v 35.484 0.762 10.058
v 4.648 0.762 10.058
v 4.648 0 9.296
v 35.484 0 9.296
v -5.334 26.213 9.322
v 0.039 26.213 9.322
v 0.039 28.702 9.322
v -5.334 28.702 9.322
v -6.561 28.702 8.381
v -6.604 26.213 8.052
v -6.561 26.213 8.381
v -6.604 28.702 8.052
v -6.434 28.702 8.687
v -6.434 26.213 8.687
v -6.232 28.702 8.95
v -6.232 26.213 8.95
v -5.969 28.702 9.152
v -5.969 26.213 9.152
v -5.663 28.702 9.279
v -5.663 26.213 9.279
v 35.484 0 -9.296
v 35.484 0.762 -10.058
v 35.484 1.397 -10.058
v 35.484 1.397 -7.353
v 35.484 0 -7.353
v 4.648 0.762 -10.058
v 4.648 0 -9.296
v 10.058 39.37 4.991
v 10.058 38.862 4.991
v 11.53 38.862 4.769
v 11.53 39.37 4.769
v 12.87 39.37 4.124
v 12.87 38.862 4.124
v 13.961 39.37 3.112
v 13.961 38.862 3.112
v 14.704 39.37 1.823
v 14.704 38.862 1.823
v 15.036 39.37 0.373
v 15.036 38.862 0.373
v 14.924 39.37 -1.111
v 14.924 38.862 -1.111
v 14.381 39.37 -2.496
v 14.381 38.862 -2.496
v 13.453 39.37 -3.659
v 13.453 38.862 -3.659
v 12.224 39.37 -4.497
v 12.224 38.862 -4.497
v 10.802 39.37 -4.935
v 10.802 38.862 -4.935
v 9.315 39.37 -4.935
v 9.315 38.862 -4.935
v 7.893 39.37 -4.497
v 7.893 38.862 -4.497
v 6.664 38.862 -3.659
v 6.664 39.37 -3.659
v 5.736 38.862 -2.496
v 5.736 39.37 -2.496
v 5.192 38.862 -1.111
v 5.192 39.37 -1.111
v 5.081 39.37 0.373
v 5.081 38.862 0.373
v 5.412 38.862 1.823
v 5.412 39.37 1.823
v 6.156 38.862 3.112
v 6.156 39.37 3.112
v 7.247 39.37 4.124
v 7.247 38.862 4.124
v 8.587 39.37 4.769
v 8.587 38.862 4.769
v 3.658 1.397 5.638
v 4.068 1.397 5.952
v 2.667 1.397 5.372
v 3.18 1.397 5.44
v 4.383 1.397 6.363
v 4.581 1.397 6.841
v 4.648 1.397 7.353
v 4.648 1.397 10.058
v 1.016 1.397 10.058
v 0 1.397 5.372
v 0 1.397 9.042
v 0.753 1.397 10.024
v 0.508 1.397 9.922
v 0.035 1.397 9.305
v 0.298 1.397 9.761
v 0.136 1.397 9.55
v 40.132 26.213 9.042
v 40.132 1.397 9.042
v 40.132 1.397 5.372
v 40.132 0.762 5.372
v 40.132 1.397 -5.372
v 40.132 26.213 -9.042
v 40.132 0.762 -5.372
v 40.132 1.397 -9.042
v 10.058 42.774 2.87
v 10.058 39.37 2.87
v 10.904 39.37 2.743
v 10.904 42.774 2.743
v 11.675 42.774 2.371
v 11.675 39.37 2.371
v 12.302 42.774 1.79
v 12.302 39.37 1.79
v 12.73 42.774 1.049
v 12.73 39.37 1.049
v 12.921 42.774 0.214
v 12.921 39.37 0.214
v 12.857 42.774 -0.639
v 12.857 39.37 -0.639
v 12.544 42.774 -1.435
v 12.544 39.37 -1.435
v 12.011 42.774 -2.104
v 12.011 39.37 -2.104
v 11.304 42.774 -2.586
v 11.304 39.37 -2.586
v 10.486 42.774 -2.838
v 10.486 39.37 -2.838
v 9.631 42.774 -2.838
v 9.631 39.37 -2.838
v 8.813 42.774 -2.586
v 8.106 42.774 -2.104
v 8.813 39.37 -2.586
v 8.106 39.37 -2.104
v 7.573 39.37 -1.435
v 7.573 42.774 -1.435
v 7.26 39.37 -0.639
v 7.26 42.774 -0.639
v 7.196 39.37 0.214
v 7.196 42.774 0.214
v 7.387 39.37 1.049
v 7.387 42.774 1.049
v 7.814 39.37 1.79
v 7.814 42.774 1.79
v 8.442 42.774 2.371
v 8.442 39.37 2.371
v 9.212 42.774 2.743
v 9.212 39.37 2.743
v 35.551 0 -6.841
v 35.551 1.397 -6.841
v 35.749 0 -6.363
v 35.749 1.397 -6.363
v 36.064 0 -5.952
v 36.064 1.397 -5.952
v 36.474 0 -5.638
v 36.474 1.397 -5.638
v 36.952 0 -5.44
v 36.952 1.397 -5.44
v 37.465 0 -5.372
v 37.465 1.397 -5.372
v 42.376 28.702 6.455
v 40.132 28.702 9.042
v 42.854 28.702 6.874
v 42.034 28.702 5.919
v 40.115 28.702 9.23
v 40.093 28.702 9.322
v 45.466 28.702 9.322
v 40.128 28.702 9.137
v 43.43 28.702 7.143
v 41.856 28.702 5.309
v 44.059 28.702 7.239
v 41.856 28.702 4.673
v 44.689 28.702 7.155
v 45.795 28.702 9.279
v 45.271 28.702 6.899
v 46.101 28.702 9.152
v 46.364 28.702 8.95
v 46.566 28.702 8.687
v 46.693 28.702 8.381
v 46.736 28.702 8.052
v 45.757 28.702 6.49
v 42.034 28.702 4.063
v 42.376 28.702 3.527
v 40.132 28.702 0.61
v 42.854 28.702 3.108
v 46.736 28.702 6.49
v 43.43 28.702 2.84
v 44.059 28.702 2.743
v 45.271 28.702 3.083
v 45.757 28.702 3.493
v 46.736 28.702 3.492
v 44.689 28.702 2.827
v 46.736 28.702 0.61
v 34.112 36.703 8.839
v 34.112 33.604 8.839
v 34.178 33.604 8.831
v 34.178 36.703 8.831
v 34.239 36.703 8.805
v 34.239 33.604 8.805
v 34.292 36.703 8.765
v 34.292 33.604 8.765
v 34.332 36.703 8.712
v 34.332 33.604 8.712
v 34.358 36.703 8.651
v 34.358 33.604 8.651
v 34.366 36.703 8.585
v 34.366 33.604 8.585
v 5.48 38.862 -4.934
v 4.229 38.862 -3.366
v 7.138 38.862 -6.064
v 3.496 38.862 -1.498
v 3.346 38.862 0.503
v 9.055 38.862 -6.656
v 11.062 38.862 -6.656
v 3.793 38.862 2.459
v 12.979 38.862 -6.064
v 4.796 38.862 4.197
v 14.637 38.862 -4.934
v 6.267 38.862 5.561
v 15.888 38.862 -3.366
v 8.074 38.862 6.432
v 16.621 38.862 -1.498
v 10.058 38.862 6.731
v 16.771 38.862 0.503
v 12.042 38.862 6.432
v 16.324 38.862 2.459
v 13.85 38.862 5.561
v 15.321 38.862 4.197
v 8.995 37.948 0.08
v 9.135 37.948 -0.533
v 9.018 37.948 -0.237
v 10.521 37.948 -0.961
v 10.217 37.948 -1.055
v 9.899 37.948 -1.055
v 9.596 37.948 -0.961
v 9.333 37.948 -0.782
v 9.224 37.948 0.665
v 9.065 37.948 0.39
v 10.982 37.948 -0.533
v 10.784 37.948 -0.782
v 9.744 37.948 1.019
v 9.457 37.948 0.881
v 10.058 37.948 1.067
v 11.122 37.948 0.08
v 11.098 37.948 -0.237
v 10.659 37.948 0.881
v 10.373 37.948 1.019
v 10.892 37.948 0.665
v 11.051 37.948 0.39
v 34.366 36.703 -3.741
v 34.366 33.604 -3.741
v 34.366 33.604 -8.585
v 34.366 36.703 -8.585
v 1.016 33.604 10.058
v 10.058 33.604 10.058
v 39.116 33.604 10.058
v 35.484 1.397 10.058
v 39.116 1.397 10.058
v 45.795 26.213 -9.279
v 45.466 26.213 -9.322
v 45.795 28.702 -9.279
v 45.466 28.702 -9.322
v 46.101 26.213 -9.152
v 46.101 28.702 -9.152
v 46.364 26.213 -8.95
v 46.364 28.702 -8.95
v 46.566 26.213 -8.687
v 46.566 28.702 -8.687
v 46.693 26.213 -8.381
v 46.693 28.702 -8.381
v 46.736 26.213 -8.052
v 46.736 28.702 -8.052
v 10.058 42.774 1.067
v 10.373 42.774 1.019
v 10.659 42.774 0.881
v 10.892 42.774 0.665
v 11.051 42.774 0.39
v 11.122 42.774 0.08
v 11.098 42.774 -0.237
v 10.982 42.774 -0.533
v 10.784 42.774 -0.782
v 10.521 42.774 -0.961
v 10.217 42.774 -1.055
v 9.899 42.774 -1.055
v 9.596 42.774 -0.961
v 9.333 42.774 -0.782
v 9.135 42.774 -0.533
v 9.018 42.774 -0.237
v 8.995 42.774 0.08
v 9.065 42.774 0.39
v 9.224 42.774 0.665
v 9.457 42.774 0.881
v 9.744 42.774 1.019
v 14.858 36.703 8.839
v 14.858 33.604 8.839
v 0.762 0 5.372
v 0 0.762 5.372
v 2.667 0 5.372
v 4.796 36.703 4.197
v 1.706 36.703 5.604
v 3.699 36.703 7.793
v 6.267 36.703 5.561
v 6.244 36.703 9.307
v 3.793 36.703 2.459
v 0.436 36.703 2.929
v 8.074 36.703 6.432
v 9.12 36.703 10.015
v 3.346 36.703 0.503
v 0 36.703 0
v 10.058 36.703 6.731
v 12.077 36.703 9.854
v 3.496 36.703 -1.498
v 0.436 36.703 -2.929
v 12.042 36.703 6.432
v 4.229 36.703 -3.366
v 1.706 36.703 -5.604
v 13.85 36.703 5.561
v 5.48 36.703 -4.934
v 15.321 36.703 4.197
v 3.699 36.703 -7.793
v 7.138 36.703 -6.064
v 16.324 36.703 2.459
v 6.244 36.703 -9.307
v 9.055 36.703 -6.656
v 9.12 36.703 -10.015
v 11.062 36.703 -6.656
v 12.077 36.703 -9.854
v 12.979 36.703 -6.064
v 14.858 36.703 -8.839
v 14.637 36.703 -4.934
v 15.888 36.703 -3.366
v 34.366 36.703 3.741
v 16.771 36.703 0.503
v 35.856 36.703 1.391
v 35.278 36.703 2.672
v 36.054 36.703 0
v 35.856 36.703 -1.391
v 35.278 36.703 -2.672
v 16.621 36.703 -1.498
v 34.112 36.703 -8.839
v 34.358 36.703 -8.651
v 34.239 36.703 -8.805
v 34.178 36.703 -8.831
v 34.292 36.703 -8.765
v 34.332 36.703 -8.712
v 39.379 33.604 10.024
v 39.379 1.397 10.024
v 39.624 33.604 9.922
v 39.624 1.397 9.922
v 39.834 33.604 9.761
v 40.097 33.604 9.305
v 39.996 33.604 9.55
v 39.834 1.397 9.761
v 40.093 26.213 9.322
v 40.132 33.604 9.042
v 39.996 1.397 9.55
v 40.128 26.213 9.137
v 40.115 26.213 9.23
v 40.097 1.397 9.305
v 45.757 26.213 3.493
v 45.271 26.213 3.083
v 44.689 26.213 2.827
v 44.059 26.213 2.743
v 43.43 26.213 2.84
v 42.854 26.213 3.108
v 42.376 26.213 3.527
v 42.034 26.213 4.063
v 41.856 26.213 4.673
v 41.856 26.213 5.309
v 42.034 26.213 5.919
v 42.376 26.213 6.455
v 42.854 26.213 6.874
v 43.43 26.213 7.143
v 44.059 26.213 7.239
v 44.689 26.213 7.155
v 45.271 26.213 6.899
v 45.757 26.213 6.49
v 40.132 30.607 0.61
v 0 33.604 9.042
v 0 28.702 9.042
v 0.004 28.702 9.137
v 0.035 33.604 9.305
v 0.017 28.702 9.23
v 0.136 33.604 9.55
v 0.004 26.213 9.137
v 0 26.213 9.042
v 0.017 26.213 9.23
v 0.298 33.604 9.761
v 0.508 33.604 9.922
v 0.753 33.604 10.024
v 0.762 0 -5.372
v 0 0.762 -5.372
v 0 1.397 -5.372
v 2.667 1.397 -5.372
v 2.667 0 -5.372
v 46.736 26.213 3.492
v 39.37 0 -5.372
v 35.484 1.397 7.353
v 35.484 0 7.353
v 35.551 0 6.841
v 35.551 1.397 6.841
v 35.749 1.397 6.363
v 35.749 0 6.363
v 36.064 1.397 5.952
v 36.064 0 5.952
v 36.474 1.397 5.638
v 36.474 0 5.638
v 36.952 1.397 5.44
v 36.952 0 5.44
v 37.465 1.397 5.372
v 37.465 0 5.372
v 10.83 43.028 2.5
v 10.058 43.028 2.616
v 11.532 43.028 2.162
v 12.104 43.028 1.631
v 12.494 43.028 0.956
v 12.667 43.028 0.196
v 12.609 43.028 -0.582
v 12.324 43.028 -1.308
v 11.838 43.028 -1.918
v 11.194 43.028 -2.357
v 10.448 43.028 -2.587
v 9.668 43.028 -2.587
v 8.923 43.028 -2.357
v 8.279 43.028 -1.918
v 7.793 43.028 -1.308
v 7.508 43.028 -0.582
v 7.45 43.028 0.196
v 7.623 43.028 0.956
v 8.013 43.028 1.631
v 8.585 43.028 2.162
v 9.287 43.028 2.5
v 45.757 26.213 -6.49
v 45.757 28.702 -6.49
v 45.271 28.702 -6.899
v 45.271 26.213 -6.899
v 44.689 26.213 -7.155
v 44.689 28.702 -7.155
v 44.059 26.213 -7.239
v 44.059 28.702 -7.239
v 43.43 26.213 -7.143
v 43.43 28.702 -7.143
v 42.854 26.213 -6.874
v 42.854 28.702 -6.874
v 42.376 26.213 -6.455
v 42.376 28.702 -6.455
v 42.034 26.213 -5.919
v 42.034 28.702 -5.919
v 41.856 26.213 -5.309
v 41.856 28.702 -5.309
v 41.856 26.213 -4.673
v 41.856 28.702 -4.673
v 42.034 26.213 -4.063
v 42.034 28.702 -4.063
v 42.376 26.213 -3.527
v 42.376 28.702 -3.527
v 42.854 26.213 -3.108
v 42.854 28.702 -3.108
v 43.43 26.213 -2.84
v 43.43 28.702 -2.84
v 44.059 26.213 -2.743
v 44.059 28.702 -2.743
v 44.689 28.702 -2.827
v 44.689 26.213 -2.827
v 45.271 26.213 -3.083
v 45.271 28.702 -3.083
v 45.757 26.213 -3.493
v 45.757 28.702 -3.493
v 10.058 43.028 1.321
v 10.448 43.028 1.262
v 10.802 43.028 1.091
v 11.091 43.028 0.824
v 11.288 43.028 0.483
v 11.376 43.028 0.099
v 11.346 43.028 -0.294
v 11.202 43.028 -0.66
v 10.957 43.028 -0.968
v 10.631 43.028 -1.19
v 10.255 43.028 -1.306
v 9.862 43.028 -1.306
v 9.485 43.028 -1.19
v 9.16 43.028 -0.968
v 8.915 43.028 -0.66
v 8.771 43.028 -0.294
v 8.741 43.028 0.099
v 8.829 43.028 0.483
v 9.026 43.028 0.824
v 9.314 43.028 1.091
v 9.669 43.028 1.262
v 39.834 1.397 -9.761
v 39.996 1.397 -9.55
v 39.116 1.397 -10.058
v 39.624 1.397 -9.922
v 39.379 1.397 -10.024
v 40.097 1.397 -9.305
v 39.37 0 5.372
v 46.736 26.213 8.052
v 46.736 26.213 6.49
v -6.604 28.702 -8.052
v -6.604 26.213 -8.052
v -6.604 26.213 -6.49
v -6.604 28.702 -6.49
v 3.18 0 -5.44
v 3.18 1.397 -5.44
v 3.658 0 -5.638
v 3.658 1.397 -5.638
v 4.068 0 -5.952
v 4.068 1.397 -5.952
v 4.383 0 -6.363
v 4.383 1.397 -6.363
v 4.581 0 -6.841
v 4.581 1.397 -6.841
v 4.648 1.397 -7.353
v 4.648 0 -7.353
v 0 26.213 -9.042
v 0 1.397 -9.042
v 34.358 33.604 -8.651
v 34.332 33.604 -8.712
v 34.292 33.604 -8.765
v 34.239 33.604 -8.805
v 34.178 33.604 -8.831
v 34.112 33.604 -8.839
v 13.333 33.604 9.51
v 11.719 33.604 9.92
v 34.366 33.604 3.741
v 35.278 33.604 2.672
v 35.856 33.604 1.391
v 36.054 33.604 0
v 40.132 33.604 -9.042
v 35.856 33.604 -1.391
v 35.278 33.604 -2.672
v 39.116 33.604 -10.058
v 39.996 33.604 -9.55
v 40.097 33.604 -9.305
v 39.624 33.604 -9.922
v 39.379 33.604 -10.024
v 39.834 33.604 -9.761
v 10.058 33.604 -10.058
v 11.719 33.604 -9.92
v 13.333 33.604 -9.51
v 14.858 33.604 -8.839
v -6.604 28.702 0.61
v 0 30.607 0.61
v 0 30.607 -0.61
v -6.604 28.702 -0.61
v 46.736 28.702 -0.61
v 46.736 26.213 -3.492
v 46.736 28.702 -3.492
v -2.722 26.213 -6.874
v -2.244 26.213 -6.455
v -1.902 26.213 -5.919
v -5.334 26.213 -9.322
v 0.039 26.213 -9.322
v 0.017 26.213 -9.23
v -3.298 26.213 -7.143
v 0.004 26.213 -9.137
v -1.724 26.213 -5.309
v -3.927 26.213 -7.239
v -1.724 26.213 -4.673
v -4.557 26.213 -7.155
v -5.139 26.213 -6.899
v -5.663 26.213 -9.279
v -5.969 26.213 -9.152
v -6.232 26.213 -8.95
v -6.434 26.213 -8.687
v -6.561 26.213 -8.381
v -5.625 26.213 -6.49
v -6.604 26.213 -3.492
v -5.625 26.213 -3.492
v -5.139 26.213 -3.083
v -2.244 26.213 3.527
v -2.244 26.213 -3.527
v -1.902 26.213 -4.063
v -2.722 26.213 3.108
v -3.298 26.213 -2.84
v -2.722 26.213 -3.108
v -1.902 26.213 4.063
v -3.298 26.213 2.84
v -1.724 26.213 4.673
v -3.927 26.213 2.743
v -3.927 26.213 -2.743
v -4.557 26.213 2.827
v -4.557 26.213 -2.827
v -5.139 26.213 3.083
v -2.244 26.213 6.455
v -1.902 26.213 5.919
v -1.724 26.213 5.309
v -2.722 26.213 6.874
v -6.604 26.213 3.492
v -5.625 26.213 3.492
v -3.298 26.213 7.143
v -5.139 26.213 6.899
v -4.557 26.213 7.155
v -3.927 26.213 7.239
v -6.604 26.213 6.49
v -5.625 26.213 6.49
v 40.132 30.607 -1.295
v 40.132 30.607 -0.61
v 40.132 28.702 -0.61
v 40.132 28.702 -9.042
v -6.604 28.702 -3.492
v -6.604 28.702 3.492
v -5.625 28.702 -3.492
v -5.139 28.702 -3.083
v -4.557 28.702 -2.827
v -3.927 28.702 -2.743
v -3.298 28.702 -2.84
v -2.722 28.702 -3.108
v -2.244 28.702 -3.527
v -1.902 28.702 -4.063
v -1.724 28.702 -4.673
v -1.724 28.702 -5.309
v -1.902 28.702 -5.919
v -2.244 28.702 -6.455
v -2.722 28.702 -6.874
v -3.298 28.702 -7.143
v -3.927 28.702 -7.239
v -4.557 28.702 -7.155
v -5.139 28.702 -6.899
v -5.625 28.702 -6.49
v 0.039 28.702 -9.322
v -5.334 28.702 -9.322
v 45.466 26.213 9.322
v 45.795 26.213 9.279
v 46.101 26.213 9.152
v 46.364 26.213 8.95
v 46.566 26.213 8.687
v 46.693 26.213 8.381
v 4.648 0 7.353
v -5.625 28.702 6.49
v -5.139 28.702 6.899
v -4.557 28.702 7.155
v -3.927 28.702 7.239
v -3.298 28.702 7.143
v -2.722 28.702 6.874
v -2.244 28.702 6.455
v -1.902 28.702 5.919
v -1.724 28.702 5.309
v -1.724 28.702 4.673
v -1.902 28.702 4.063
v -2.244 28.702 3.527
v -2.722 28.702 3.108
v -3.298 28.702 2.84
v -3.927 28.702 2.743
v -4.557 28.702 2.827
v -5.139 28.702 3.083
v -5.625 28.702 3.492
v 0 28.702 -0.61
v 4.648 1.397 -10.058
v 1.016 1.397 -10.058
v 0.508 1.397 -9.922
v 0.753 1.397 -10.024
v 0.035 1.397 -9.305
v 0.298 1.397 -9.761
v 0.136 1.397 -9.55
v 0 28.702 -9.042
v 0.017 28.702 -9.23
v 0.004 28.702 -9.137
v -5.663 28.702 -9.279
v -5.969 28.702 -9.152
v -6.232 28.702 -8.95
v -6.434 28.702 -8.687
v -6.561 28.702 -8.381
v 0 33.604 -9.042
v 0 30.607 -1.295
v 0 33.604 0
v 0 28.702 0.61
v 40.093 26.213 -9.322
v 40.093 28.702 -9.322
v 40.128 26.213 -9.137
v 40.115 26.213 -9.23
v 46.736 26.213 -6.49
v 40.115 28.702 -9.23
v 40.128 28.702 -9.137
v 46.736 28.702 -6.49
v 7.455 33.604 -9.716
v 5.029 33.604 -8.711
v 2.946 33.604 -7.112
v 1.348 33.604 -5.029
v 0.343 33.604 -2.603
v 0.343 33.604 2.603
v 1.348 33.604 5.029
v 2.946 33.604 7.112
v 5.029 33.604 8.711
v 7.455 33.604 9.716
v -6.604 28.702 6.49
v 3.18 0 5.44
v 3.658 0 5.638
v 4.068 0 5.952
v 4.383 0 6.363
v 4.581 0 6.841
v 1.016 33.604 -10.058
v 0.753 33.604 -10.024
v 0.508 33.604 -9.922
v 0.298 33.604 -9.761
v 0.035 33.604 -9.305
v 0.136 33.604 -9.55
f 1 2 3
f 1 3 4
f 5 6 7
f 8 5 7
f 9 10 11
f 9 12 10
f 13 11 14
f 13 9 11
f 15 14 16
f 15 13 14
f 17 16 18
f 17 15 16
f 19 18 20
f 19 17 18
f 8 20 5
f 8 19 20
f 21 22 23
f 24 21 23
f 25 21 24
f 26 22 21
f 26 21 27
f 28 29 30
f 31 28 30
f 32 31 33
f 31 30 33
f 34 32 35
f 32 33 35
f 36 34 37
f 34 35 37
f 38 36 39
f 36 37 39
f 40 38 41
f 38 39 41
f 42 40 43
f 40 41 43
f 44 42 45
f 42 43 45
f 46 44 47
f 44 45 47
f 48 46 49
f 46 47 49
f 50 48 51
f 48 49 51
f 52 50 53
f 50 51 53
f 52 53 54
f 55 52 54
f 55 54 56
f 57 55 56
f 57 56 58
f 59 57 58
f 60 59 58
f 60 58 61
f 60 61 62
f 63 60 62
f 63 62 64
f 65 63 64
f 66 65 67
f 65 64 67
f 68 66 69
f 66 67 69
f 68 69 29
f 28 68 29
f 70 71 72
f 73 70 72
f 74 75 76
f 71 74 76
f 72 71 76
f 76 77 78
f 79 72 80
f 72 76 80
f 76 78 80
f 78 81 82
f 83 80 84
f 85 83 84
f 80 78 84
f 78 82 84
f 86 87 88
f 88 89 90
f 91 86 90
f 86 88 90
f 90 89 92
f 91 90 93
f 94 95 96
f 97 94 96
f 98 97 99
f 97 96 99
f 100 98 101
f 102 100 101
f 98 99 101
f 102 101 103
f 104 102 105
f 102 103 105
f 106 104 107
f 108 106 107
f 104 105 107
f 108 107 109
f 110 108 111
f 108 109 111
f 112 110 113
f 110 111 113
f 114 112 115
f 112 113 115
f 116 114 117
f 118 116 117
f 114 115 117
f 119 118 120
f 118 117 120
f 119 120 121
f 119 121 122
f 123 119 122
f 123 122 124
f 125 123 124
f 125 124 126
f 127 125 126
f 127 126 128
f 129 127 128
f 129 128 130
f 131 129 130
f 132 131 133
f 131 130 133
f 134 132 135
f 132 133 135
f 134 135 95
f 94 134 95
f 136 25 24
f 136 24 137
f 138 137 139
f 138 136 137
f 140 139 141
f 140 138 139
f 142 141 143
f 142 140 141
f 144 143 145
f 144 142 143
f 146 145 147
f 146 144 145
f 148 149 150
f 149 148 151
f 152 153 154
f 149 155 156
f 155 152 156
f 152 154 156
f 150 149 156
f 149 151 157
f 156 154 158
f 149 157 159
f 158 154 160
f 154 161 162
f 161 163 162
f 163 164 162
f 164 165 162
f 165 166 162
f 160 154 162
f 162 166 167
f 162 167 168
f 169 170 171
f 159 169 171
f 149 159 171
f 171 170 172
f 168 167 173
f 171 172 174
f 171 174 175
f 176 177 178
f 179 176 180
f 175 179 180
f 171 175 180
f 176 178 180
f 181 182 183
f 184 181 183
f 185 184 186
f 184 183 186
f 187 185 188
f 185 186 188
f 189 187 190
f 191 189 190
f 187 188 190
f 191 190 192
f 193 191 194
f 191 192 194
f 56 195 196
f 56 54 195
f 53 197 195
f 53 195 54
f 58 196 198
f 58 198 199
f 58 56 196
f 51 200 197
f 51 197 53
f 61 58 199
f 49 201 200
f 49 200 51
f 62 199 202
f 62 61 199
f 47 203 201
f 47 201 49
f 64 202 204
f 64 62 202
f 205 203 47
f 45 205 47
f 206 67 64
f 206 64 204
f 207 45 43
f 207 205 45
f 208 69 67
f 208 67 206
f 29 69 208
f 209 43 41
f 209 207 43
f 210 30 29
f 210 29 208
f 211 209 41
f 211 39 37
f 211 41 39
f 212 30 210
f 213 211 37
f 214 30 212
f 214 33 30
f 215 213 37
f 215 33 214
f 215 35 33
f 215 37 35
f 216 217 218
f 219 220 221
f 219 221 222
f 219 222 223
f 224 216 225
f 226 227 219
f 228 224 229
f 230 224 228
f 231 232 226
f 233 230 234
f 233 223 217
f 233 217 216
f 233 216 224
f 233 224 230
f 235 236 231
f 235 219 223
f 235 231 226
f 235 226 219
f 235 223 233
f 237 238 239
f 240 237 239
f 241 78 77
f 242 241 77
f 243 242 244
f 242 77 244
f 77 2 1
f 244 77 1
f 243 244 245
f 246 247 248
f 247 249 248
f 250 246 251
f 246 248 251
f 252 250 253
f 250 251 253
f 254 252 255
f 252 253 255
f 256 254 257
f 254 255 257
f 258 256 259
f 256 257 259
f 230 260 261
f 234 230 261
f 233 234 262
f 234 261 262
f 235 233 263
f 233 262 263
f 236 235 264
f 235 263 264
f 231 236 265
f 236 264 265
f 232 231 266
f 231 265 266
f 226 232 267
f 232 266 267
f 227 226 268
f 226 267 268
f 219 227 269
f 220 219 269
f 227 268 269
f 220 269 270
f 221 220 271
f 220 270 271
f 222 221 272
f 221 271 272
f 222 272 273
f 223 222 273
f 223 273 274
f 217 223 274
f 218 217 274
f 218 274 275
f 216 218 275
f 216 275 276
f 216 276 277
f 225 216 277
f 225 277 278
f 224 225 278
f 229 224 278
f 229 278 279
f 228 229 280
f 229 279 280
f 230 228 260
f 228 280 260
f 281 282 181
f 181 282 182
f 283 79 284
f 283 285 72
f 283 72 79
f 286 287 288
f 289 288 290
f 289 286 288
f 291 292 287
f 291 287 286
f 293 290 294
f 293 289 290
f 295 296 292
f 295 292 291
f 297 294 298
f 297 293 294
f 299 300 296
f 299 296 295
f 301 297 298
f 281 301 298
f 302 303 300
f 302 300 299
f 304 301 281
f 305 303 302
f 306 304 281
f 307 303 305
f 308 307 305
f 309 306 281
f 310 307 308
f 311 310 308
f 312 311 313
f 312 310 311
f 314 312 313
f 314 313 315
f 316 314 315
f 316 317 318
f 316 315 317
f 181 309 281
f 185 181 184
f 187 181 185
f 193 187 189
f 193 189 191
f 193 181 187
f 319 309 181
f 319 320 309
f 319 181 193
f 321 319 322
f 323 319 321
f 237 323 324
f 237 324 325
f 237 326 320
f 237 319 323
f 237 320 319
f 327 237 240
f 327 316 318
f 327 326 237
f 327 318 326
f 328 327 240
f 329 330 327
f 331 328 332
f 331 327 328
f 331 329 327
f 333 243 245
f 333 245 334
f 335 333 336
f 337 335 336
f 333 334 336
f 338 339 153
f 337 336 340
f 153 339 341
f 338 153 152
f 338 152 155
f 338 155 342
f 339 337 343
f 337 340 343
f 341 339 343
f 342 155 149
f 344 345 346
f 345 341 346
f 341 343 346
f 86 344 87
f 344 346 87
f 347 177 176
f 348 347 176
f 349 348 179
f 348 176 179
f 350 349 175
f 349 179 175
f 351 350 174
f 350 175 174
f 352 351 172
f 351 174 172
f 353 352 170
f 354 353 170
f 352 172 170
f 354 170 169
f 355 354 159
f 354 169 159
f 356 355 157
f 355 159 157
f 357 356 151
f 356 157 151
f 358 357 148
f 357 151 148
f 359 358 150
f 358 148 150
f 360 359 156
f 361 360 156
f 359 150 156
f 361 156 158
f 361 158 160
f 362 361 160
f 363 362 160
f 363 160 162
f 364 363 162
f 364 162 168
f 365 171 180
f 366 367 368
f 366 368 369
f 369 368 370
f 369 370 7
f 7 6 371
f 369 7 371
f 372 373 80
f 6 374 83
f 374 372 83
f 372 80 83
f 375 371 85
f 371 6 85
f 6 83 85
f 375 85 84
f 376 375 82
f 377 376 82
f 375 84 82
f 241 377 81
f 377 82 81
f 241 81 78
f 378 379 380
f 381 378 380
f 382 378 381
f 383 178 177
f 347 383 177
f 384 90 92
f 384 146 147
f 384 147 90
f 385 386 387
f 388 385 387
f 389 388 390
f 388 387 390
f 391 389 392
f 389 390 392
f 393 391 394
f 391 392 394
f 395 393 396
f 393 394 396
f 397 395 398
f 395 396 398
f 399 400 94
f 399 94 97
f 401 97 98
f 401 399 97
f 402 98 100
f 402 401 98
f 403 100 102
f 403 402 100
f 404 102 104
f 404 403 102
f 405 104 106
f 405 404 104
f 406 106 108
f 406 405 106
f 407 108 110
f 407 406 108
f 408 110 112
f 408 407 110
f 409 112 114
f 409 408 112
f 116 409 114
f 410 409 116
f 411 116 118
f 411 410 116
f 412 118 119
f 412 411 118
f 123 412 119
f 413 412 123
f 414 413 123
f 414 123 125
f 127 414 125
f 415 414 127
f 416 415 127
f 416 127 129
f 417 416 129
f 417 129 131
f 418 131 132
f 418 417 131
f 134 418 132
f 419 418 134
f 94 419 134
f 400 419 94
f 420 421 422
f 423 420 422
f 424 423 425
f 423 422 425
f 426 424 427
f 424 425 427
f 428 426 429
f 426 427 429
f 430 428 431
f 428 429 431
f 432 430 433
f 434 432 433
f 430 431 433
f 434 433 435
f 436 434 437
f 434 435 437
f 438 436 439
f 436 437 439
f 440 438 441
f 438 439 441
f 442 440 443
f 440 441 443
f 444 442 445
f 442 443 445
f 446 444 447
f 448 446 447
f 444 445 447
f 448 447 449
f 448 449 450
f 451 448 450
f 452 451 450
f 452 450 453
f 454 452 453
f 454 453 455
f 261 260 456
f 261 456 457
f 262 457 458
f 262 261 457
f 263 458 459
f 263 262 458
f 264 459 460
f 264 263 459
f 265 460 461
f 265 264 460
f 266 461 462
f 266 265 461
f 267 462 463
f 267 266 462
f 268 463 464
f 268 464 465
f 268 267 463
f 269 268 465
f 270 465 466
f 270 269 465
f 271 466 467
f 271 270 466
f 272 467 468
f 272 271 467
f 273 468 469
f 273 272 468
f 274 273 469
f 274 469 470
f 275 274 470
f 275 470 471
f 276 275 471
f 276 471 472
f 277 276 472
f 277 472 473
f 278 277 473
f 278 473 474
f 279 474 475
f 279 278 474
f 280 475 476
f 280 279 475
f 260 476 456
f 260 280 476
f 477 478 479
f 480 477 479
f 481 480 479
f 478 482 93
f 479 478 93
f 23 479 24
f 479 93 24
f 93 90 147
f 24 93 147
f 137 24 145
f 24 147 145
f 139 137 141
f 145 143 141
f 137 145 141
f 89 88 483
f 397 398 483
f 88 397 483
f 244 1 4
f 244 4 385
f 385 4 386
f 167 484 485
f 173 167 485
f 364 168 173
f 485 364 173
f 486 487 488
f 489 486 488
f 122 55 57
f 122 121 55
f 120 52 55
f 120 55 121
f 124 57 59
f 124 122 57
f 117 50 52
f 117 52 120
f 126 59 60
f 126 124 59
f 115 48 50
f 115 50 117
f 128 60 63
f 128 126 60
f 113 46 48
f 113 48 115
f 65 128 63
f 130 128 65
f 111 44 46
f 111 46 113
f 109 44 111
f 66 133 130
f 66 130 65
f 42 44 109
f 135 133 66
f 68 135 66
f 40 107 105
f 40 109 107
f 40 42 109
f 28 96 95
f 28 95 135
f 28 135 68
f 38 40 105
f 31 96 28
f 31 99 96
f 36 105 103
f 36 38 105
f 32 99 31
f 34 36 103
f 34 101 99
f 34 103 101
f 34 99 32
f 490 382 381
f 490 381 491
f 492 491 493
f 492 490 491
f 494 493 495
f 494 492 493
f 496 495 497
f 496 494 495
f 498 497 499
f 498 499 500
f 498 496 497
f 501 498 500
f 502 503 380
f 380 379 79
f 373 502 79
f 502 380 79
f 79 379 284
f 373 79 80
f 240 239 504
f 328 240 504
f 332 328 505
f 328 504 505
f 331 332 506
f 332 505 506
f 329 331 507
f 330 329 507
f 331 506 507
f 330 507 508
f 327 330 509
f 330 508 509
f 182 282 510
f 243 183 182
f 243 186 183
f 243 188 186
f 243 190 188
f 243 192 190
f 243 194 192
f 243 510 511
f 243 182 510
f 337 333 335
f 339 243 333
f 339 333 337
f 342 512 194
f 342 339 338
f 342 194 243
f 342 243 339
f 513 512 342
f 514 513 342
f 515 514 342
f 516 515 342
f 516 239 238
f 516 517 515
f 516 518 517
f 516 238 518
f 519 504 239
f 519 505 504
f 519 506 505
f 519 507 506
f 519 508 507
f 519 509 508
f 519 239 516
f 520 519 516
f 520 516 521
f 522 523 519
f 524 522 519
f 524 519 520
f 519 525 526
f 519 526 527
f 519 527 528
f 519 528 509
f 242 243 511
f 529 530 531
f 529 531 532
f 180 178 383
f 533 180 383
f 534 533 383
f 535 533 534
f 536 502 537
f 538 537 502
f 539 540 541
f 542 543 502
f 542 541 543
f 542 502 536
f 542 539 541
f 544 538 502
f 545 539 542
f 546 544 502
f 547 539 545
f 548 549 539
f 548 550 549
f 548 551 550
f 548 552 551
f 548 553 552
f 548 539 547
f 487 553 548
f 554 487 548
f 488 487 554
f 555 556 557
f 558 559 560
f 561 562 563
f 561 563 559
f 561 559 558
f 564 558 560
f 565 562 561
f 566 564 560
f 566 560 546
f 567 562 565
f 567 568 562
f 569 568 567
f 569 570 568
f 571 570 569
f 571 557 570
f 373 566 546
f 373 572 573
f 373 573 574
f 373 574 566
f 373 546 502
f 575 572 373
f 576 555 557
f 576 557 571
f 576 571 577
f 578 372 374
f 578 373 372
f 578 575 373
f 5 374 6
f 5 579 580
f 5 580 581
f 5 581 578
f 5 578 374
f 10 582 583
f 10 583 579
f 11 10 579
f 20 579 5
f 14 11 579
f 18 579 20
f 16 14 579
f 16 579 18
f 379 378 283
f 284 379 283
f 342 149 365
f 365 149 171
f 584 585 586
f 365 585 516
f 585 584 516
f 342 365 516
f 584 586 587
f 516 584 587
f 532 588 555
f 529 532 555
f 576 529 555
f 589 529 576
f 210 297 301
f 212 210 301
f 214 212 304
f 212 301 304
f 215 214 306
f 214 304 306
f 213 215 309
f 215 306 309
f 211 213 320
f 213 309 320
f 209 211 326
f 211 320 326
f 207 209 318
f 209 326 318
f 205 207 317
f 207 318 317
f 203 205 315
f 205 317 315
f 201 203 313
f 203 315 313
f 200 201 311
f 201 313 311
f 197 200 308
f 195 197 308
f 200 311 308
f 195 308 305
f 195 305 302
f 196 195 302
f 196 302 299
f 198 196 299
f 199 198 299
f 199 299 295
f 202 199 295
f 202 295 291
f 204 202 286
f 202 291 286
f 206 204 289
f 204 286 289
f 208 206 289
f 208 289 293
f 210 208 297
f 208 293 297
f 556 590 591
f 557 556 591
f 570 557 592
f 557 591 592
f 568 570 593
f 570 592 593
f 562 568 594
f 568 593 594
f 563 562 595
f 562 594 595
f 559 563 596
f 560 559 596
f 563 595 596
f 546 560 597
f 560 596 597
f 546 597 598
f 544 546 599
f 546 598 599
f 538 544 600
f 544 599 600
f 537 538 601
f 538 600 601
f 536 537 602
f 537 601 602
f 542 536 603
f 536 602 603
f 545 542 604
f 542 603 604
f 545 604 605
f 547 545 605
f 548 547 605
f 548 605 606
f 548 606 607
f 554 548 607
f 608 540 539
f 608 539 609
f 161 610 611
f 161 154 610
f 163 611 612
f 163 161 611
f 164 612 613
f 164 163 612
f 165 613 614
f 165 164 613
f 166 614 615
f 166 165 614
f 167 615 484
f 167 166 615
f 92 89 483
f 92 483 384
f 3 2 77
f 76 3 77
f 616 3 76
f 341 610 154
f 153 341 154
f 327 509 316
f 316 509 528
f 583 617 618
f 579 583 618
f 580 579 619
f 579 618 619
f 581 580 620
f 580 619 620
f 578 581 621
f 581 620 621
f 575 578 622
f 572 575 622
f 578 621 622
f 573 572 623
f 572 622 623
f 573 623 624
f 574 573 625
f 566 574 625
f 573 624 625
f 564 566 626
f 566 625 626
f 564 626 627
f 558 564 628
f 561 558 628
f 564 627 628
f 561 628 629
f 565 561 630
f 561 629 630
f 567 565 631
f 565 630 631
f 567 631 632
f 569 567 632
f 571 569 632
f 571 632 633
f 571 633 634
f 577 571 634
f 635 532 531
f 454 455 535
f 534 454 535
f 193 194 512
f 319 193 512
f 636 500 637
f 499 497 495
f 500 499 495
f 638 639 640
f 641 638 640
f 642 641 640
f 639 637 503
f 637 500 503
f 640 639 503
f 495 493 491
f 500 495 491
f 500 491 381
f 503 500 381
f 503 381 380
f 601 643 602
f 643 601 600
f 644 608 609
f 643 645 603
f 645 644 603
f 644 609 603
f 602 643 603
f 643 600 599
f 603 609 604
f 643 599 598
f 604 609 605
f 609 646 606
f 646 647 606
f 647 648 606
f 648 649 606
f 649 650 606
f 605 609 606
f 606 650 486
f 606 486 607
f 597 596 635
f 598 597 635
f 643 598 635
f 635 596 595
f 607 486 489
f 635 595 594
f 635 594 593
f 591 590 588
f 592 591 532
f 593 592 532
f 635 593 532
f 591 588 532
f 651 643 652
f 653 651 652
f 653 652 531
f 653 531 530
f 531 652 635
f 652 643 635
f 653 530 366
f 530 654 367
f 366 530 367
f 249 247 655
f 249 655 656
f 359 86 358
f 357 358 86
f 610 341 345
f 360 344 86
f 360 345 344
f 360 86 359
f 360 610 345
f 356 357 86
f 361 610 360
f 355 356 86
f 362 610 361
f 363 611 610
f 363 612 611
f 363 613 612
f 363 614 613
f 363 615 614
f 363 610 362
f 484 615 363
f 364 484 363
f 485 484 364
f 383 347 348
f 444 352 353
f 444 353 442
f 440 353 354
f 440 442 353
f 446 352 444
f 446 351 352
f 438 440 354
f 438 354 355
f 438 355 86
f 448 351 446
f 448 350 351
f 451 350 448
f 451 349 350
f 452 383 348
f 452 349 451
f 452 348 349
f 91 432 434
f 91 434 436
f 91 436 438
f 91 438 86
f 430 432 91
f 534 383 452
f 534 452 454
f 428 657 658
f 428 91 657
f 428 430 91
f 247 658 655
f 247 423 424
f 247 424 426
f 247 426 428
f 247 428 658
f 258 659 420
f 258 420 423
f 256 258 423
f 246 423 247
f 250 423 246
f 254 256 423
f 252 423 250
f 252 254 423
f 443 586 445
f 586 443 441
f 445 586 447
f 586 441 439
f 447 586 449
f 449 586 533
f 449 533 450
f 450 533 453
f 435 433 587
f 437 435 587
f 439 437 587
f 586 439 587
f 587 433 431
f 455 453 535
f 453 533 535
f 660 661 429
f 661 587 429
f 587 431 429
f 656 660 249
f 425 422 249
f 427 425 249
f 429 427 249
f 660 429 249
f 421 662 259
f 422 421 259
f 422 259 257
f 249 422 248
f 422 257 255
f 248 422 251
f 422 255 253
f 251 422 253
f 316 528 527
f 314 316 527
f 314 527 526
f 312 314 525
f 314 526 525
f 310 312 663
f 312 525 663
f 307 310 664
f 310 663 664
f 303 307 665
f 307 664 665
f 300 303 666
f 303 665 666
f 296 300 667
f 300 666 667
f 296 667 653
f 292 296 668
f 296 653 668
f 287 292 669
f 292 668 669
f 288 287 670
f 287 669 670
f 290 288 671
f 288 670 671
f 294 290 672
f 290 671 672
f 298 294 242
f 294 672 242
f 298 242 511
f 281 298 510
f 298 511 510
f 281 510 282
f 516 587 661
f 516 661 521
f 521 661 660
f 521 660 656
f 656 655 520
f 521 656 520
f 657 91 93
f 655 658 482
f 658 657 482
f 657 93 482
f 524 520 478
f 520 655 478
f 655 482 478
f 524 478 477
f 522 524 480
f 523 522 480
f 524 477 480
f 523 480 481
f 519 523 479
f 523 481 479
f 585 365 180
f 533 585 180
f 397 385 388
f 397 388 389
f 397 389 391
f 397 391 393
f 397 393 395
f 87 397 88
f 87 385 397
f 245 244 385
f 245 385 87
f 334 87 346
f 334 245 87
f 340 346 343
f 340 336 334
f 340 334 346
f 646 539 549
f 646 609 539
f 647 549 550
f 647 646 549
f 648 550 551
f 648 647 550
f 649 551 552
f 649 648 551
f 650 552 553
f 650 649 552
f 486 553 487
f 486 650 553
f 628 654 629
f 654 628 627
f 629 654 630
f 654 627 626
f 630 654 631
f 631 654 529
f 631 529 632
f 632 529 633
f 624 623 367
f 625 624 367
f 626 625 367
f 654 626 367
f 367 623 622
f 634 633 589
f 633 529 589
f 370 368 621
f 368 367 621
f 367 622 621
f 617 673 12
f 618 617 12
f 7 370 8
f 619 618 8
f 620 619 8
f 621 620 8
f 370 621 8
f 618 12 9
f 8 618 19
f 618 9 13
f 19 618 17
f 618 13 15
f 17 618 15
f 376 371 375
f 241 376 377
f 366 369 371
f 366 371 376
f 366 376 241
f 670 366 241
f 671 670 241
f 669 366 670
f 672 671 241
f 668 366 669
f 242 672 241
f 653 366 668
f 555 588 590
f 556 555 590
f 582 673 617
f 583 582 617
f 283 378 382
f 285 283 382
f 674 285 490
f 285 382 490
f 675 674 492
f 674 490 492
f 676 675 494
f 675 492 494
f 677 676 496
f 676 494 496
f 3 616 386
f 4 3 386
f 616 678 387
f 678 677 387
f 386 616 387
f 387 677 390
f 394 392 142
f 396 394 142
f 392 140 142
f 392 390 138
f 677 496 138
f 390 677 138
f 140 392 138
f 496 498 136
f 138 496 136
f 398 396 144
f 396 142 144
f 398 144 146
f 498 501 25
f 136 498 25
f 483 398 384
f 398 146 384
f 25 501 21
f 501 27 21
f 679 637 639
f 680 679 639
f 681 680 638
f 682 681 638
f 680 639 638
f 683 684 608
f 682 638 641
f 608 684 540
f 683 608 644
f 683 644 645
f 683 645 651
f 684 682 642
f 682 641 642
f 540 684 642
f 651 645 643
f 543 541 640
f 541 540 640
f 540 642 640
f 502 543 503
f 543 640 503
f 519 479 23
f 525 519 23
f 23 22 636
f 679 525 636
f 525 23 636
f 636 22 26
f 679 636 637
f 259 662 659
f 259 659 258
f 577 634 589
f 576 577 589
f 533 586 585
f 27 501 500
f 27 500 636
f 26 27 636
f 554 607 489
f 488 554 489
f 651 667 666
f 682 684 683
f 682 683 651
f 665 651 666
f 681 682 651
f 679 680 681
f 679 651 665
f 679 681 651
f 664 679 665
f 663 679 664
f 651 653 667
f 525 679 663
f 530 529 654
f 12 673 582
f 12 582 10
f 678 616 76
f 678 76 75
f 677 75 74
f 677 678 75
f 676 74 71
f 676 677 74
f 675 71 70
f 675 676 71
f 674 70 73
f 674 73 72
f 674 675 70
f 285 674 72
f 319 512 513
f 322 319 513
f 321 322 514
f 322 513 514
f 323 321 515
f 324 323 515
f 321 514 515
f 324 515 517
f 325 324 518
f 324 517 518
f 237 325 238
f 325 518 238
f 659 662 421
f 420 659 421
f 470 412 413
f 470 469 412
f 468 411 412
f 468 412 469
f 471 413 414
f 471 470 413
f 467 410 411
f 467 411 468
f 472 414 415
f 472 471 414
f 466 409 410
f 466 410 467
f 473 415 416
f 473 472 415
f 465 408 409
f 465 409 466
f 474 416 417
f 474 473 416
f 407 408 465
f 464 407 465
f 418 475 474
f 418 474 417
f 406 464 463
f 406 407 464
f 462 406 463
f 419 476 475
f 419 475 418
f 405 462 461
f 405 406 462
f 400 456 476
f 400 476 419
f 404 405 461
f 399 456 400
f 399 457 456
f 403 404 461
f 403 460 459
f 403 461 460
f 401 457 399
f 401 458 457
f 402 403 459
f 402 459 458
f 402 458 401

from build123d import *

# Parameters (mm, degrees)
BOSS_EXTRUDE1_DEPTH = 33.6042
CUT_EXTRUDE1_DEPTH  = 1.397
CHAMFER1_SIZE       = 0.762
SKETCH3_W           = 18.6436
SKETCH3_H           = 2.4892
BOSS_EXTRUDE2_DEPTH = 6.604
SKETCH4_W           = 18.6436
SKETCH4_H           = 2.4892
BOSS_EXTRUDE3_DEPTH = 6.604
FILLET1_R           = 1.27
CUT_EXTRUDE2_DEPTH  = 3.048
SKETCH6_W           = 6.604
SKETCH6_H           = 1.2192
BOSS_EXTRUDE4_DEPTH = 1.905
CUT_EXTRUDE3_DEPTH  = 1.905
BOSS_EXTRUDE5_DEPTH = 3.0988
SKETCH9_R           = 6.731
BOSS_EXTRUDE6_DEPTH = 2.159
SKETCH10_R          = 4.9911
BOSS_EXTRUDE7_DEPTH = 0.508
SKETCH11_R          = 2.8702
BOSS_EXTRUDE8_DEPTH = 3.6576
SKETCH12_R          = 1.0668
CUT_EXTRUDE4_DEPTH  = 5.08
CHAMFER2_SIZE       = 0.254


with BuildPart() as part:
    # Sketch1 → Boss-Extrude1 (new body)
    with BuildSketch(Plane(origin=(0, 0, 0), x_dir=(1, 0, 0), z_dir=(0, 1, 0))):
        with BuildLine():
            Line((0, 9.0424), (0, -9.0424))
            ThreePointArc((0, -9.0424), (0.29757951, -9.76082049), (1.016, -10.0584))
            Line((1.016, -10.0584), (39.116, -10.0584))
            ThreePointArc((39.116, -10.0584), (39.83442049, -9.76082049), (40.132, -9.0424))
            Line((40.132, -9.0424), (40.132, 9.0424))
            ThreePointArc((40.132, 9.0424), (39.83442049, 9.76082049), (39.116, 10.0584))
            Line((39.116, 10.0584), (1.016, 10.0584))
            ThreePointArc((1.016, 10.0584), (0.29757951, 9.76082049), (0, 9.0424))
        make_face()
    extrude(amount=BOSS_EXTRUDE1_DEPTH)

    # Sketch2 → Cut-Extrude1 (cut)
    with BuildSketch(Plane.XZ):
        with BuildLine():
            Line((4.6482, 10.0584), (4.6482, 7.3533))
            ThreePointArc((4.6482, 7.3533), (4.067919955, 5.952380045), (2.667, 5.3721))
            Line((2.667, 5.3721), (0, 5.3721))
            Line((0, 5.3721), (0, 9.0424))
            ThreePointArc((0, 9.0424), (0.29757951, 9.76082049), (1.016, 10.0584))
            Line((1.016, 10.0584), (4.6482, 10.0584))
        make_face()
        with BuildLine():
            Line((35.4838, 10.0584), (35.4838, 7.3533))
            ThreePointArc((35.4838, 7.3533), (36.064080045, 5.952380045), (37.465, 5.3721))
            Line((37.465, 5.3721), (40.132, 5.3721))
            Line((40.132, 5.3721), (40.132, 9.0424))
            ThreePointArc((40.132, 9.0424), (39.83442049, 9.76082049), (39.116, 10.0584))
            Line((39.116, 10.0584), (35.4838, 10.0584))
        make_face()
        with BuildLine():
            Line((0, -5.3721), (2.667, -5.3721))
            ThreePointArc((2.667, -5.3721), (4.067919955, -5.952380045), (4.6482, -7.3533))
            Line((4.6482, -7.3533), (4.6482, -10.0584))
            Line((4.6482, -10.0584), (1.016, -10.0584))
            ThreePointArc((1.016, -10.0584), (0.29757951, -9.76082049), (0, -9.0424))
            Line((0, -9.0424), (0, -5.3721))
        make_face()
        with BuildLine():
            Line((37.465, -5.3721), (40.132, -5.3721))
            Line((40.132, -5.3721), (40.132, -9.0424))
            ThreePointArc((40.132, -9.0424), (39.83442049, -9.76082049), (39.116, -10.0584))
            Line((39.116, -10.0584), (35.4838, -10.0584))
            Line((35.4838, -10.0584), (35.4838, -7.3533))
            ThreePointArc((35.4838, -7.3533), (36.064080045, -5.952380045), (37.465, -5.3721))
        make_face()
    extrude(amount=-CUT_EXTRUDE1_DEPTH, mode=Mode.SUBTRACT)

    # Chamfer1
    chamfer1_edges = [part.edges().sort_by_distance(p)[0] for p in [
        (20.066, 0, 10.0584),
        (0, 0, 0),
        (40.132, 0, 0),
        (20.066, 0, -10.0584),
    ]]
    chamfer(chamfer1_edges, length=CHAMFER1_SIZE)

    # Sketch3 → Boss-Extrude2 (add, symmetric)
    with BuildSketch(Plane(origin=(40.132, 0, 0), x_dir=(0, 0, -1), z_dir=(1, 0, 0))):
        with Locations((0, 27.4574)):
            Rectangle(SKETCH3_W, SKETCH3_H)
    extrude(amount=BOSS_EXTRUDE2_DEPTH, both=True)

    # Sketch4 → Boss-Extrude3 (add, symmetric)
    with BuildSketch(Plane.ZY):
        with Locations((0, 27.4574)):
            Rectangle(SKETCH4_W, SKETCH4_H)
    extrude(amount=BOSS_EXTRUDE3_DEPTH, both=True)

    # Fillet1
    fillet1_edges = [part.edges().sort_by_distance(p)[0] for p in [
        (46.736, 27.4574, 9.3218),
        (46.736, 27.4574, -9.3218),
        (-6.604, 27.4574, -9.3218),
        (-6.604, 27.4574, 9.3218),
    ]]
    fillet(fillet1_edges, radius=FILLET1_R)

    # Sketch5 → Cut-Extrude2 (cut)
    with BuildSketch(Plane(origin=(0, 28.702, 0), x_dir=(1, 0, 0), z_dir=(0, 1, 0))):
        with BuildLine():
            Line((-6.604, 3.4925), (-5.625185736, 3.4925))
            ThreePointArc((-5.625185736, 3.4925), (-1.7018, 4.9911), (-5.625185736, 6.4897))
            Line((-5.625185736, 6.4897), (-6.604, 6.4897))
            Line((-6.604, 6.4897), (-6.604, 3.4925))
        make_face()
        with BuildLine():
            Line((-6.604, -6.4897), (-5.625185736, -6.4897))
            ThreePointArc((-5.625185736, -6.4897), (-1.7018, -4.9911), (-5.625185736, -3.4925))
            Line((-5.625185736, -3.4925), (-6.604, -3.4925))
            Line((-6.604, -3.4925), (-6.604, -6.4897))
        make_face()
        with BuildLine():
            Line((45.757185736, -6.4897), (46.736, -6.4897))
            Line((46.736, -6.4897), (46.736, -3.4925))
            Line((46.736, -3.4925), (45.757185736, -3.4925))
            ThreePointArc((45.757185736, -3.4925), (41.8338, -4.9911), (45.757185736, -6.4897))
        make_face()
        with BuildLine():
            Line((45.757185736, 3.4925), (46.736, 3.4925))
            Line((46.736, 3.4925), (46.736, 6.4897))
            Line((46.736, 6.4897), (45.757185736, 6.4897))
            ThreePointArc((45.757185736, 6.4897), (41.8338, 4.9911), (45.757185736, 3.4925))
        make_face()
    extrude(amount=-CUT_EXTRUDE2_DEPTH, mode=Mode.SUBTRACT)

    # Sketch6 → Boss-Extrude4 (add)
    with BuildSketch(Plane(origin=(0, 28.702, 0), x_dir=(1, 0, 0), z_dir=(0, 1, 0))):
        with Locations((-3.302, 0)):
            Rectangle(SKETCH6_W, SKETCH6_H)
        with Locations((43.434, 0)):
            Rectangle(SKETCH6_W, SKETCH6_H)
    extrude(amount=BOSS_EXTRUDE4_DEPTH)

    # Sketch7 → Cut-Extrude3 (cut)
    with BuildSketch(Plane.XY.offset(0.6096)):
        Polygon((40.132, 30.607), (46.736, 28.702), (46.736, 30.607), align=None)
        Polygon((0, 30.607), (-6.604, 28.702), (-6.604, 30.607), align=None)
    extrude(amount=-CUT_EXTRUDE3_DEPTH, mode=Mode.SUBTRACT)

    # Sketch8 → Boss-Extrude5 (add)
    with BuildSketch(Plane(origin=(0, 33.6042, 0), x_dir=(1, 0, 0), z_dir=(0, 1, 0))):
        with BuildLine():
            Line((14.8583952, -8.8392), (34.1122, -8.8392))
            ThreePointArc((34.1122, -8.8392), (34.291805122, -8.764805122), (34.3662, -8.5852))
            Line((34.3662, -8.5852), (34.3662, -3.741254719))
            ThreePointArc((34.3662, -3.741254719), (36.053651663, 0), (34.3662, 3.741254719))
            Line((34.3662, 3.741254719), (34.3662, 8.5852))
            ThreePointArc((34.3662, 8.5852), (34.291805122, 8.764805122), (34.1122, 8.8392))
            Line((34.1122, 8.8392), (14.8583952, 8.8392))
            ThreePointArc((14.8583952, 8.8392), (0, 0), (14.8583952, -8.8392))
        make_face()
    extrude(amount=BOSS_EXTRUDE5_DEPTH)

    # Sketch9 → Boss-Extrude6 (add)
    with BuildSketch(Plane(origin=(0, 36.703, 0), x_dir=(1, 0, 0), z_dir=(0, 1, 0))):
        with Locations(Location((10.0584, 0, 0), (0, 0, 270))):
            Circle(SKETCH9_R)
    extrude(amount=BOSS_EXTRUDE6_DEPTH)

    # Sketch10 → Boss-Extrude7 (add)
    with BuildSketch(Plane(origin=(0, 38.862, 0), x_dir=(1, 0, 0), z_dir=(0, 1, 0))):
        with Locations(Location((10.0584, 0, 0), (0, 0, 270))):
            Circle(SKETCH10_R)
    extrude(amount=BOSS_EXTRUDE7_DEPTH)

    # Sketch11 → Boss-Extrude8 (add)
    with BuildSketch(Plane(origin=(0, 39.37, 0), x_dir=(1, 0, 0), z_dir=(0, 1, 0))):
        with Locations(Location((10.0584, 0, 0), (0, 0, 270))):
            Circle(SKETCH11_R)
    extrude(amount=BOSS_EXTRUDE8_DEPTH)

    # Sketch12 → Cut-Extrude4 (cut)
    with BuildSketch(Plane(origin=(0, 43.0276, 0), x_dir=(1, 0, 0), z_dir=(0, 1, 0))):
        with Locations(Location((10.0584, 0, 0), (0, 0, 270))):
            Circle(SKETCH12_R)
    extrude(amount=-CUT_EXTRUDE4_DEPTH, mode=Mode.SUBTRACT)

    # Chamfer2
    chamfer2_edges = [part.edges().sort_by_distance(p)[0] for p in [
        (10.0584, 43.0276, -2.8702),
        (10.0584, 43.0276, -1.0668),
    ]]
    chamfer(chamfer2_edges, length=CHAMFER2_SIZE)


solid = part.part
